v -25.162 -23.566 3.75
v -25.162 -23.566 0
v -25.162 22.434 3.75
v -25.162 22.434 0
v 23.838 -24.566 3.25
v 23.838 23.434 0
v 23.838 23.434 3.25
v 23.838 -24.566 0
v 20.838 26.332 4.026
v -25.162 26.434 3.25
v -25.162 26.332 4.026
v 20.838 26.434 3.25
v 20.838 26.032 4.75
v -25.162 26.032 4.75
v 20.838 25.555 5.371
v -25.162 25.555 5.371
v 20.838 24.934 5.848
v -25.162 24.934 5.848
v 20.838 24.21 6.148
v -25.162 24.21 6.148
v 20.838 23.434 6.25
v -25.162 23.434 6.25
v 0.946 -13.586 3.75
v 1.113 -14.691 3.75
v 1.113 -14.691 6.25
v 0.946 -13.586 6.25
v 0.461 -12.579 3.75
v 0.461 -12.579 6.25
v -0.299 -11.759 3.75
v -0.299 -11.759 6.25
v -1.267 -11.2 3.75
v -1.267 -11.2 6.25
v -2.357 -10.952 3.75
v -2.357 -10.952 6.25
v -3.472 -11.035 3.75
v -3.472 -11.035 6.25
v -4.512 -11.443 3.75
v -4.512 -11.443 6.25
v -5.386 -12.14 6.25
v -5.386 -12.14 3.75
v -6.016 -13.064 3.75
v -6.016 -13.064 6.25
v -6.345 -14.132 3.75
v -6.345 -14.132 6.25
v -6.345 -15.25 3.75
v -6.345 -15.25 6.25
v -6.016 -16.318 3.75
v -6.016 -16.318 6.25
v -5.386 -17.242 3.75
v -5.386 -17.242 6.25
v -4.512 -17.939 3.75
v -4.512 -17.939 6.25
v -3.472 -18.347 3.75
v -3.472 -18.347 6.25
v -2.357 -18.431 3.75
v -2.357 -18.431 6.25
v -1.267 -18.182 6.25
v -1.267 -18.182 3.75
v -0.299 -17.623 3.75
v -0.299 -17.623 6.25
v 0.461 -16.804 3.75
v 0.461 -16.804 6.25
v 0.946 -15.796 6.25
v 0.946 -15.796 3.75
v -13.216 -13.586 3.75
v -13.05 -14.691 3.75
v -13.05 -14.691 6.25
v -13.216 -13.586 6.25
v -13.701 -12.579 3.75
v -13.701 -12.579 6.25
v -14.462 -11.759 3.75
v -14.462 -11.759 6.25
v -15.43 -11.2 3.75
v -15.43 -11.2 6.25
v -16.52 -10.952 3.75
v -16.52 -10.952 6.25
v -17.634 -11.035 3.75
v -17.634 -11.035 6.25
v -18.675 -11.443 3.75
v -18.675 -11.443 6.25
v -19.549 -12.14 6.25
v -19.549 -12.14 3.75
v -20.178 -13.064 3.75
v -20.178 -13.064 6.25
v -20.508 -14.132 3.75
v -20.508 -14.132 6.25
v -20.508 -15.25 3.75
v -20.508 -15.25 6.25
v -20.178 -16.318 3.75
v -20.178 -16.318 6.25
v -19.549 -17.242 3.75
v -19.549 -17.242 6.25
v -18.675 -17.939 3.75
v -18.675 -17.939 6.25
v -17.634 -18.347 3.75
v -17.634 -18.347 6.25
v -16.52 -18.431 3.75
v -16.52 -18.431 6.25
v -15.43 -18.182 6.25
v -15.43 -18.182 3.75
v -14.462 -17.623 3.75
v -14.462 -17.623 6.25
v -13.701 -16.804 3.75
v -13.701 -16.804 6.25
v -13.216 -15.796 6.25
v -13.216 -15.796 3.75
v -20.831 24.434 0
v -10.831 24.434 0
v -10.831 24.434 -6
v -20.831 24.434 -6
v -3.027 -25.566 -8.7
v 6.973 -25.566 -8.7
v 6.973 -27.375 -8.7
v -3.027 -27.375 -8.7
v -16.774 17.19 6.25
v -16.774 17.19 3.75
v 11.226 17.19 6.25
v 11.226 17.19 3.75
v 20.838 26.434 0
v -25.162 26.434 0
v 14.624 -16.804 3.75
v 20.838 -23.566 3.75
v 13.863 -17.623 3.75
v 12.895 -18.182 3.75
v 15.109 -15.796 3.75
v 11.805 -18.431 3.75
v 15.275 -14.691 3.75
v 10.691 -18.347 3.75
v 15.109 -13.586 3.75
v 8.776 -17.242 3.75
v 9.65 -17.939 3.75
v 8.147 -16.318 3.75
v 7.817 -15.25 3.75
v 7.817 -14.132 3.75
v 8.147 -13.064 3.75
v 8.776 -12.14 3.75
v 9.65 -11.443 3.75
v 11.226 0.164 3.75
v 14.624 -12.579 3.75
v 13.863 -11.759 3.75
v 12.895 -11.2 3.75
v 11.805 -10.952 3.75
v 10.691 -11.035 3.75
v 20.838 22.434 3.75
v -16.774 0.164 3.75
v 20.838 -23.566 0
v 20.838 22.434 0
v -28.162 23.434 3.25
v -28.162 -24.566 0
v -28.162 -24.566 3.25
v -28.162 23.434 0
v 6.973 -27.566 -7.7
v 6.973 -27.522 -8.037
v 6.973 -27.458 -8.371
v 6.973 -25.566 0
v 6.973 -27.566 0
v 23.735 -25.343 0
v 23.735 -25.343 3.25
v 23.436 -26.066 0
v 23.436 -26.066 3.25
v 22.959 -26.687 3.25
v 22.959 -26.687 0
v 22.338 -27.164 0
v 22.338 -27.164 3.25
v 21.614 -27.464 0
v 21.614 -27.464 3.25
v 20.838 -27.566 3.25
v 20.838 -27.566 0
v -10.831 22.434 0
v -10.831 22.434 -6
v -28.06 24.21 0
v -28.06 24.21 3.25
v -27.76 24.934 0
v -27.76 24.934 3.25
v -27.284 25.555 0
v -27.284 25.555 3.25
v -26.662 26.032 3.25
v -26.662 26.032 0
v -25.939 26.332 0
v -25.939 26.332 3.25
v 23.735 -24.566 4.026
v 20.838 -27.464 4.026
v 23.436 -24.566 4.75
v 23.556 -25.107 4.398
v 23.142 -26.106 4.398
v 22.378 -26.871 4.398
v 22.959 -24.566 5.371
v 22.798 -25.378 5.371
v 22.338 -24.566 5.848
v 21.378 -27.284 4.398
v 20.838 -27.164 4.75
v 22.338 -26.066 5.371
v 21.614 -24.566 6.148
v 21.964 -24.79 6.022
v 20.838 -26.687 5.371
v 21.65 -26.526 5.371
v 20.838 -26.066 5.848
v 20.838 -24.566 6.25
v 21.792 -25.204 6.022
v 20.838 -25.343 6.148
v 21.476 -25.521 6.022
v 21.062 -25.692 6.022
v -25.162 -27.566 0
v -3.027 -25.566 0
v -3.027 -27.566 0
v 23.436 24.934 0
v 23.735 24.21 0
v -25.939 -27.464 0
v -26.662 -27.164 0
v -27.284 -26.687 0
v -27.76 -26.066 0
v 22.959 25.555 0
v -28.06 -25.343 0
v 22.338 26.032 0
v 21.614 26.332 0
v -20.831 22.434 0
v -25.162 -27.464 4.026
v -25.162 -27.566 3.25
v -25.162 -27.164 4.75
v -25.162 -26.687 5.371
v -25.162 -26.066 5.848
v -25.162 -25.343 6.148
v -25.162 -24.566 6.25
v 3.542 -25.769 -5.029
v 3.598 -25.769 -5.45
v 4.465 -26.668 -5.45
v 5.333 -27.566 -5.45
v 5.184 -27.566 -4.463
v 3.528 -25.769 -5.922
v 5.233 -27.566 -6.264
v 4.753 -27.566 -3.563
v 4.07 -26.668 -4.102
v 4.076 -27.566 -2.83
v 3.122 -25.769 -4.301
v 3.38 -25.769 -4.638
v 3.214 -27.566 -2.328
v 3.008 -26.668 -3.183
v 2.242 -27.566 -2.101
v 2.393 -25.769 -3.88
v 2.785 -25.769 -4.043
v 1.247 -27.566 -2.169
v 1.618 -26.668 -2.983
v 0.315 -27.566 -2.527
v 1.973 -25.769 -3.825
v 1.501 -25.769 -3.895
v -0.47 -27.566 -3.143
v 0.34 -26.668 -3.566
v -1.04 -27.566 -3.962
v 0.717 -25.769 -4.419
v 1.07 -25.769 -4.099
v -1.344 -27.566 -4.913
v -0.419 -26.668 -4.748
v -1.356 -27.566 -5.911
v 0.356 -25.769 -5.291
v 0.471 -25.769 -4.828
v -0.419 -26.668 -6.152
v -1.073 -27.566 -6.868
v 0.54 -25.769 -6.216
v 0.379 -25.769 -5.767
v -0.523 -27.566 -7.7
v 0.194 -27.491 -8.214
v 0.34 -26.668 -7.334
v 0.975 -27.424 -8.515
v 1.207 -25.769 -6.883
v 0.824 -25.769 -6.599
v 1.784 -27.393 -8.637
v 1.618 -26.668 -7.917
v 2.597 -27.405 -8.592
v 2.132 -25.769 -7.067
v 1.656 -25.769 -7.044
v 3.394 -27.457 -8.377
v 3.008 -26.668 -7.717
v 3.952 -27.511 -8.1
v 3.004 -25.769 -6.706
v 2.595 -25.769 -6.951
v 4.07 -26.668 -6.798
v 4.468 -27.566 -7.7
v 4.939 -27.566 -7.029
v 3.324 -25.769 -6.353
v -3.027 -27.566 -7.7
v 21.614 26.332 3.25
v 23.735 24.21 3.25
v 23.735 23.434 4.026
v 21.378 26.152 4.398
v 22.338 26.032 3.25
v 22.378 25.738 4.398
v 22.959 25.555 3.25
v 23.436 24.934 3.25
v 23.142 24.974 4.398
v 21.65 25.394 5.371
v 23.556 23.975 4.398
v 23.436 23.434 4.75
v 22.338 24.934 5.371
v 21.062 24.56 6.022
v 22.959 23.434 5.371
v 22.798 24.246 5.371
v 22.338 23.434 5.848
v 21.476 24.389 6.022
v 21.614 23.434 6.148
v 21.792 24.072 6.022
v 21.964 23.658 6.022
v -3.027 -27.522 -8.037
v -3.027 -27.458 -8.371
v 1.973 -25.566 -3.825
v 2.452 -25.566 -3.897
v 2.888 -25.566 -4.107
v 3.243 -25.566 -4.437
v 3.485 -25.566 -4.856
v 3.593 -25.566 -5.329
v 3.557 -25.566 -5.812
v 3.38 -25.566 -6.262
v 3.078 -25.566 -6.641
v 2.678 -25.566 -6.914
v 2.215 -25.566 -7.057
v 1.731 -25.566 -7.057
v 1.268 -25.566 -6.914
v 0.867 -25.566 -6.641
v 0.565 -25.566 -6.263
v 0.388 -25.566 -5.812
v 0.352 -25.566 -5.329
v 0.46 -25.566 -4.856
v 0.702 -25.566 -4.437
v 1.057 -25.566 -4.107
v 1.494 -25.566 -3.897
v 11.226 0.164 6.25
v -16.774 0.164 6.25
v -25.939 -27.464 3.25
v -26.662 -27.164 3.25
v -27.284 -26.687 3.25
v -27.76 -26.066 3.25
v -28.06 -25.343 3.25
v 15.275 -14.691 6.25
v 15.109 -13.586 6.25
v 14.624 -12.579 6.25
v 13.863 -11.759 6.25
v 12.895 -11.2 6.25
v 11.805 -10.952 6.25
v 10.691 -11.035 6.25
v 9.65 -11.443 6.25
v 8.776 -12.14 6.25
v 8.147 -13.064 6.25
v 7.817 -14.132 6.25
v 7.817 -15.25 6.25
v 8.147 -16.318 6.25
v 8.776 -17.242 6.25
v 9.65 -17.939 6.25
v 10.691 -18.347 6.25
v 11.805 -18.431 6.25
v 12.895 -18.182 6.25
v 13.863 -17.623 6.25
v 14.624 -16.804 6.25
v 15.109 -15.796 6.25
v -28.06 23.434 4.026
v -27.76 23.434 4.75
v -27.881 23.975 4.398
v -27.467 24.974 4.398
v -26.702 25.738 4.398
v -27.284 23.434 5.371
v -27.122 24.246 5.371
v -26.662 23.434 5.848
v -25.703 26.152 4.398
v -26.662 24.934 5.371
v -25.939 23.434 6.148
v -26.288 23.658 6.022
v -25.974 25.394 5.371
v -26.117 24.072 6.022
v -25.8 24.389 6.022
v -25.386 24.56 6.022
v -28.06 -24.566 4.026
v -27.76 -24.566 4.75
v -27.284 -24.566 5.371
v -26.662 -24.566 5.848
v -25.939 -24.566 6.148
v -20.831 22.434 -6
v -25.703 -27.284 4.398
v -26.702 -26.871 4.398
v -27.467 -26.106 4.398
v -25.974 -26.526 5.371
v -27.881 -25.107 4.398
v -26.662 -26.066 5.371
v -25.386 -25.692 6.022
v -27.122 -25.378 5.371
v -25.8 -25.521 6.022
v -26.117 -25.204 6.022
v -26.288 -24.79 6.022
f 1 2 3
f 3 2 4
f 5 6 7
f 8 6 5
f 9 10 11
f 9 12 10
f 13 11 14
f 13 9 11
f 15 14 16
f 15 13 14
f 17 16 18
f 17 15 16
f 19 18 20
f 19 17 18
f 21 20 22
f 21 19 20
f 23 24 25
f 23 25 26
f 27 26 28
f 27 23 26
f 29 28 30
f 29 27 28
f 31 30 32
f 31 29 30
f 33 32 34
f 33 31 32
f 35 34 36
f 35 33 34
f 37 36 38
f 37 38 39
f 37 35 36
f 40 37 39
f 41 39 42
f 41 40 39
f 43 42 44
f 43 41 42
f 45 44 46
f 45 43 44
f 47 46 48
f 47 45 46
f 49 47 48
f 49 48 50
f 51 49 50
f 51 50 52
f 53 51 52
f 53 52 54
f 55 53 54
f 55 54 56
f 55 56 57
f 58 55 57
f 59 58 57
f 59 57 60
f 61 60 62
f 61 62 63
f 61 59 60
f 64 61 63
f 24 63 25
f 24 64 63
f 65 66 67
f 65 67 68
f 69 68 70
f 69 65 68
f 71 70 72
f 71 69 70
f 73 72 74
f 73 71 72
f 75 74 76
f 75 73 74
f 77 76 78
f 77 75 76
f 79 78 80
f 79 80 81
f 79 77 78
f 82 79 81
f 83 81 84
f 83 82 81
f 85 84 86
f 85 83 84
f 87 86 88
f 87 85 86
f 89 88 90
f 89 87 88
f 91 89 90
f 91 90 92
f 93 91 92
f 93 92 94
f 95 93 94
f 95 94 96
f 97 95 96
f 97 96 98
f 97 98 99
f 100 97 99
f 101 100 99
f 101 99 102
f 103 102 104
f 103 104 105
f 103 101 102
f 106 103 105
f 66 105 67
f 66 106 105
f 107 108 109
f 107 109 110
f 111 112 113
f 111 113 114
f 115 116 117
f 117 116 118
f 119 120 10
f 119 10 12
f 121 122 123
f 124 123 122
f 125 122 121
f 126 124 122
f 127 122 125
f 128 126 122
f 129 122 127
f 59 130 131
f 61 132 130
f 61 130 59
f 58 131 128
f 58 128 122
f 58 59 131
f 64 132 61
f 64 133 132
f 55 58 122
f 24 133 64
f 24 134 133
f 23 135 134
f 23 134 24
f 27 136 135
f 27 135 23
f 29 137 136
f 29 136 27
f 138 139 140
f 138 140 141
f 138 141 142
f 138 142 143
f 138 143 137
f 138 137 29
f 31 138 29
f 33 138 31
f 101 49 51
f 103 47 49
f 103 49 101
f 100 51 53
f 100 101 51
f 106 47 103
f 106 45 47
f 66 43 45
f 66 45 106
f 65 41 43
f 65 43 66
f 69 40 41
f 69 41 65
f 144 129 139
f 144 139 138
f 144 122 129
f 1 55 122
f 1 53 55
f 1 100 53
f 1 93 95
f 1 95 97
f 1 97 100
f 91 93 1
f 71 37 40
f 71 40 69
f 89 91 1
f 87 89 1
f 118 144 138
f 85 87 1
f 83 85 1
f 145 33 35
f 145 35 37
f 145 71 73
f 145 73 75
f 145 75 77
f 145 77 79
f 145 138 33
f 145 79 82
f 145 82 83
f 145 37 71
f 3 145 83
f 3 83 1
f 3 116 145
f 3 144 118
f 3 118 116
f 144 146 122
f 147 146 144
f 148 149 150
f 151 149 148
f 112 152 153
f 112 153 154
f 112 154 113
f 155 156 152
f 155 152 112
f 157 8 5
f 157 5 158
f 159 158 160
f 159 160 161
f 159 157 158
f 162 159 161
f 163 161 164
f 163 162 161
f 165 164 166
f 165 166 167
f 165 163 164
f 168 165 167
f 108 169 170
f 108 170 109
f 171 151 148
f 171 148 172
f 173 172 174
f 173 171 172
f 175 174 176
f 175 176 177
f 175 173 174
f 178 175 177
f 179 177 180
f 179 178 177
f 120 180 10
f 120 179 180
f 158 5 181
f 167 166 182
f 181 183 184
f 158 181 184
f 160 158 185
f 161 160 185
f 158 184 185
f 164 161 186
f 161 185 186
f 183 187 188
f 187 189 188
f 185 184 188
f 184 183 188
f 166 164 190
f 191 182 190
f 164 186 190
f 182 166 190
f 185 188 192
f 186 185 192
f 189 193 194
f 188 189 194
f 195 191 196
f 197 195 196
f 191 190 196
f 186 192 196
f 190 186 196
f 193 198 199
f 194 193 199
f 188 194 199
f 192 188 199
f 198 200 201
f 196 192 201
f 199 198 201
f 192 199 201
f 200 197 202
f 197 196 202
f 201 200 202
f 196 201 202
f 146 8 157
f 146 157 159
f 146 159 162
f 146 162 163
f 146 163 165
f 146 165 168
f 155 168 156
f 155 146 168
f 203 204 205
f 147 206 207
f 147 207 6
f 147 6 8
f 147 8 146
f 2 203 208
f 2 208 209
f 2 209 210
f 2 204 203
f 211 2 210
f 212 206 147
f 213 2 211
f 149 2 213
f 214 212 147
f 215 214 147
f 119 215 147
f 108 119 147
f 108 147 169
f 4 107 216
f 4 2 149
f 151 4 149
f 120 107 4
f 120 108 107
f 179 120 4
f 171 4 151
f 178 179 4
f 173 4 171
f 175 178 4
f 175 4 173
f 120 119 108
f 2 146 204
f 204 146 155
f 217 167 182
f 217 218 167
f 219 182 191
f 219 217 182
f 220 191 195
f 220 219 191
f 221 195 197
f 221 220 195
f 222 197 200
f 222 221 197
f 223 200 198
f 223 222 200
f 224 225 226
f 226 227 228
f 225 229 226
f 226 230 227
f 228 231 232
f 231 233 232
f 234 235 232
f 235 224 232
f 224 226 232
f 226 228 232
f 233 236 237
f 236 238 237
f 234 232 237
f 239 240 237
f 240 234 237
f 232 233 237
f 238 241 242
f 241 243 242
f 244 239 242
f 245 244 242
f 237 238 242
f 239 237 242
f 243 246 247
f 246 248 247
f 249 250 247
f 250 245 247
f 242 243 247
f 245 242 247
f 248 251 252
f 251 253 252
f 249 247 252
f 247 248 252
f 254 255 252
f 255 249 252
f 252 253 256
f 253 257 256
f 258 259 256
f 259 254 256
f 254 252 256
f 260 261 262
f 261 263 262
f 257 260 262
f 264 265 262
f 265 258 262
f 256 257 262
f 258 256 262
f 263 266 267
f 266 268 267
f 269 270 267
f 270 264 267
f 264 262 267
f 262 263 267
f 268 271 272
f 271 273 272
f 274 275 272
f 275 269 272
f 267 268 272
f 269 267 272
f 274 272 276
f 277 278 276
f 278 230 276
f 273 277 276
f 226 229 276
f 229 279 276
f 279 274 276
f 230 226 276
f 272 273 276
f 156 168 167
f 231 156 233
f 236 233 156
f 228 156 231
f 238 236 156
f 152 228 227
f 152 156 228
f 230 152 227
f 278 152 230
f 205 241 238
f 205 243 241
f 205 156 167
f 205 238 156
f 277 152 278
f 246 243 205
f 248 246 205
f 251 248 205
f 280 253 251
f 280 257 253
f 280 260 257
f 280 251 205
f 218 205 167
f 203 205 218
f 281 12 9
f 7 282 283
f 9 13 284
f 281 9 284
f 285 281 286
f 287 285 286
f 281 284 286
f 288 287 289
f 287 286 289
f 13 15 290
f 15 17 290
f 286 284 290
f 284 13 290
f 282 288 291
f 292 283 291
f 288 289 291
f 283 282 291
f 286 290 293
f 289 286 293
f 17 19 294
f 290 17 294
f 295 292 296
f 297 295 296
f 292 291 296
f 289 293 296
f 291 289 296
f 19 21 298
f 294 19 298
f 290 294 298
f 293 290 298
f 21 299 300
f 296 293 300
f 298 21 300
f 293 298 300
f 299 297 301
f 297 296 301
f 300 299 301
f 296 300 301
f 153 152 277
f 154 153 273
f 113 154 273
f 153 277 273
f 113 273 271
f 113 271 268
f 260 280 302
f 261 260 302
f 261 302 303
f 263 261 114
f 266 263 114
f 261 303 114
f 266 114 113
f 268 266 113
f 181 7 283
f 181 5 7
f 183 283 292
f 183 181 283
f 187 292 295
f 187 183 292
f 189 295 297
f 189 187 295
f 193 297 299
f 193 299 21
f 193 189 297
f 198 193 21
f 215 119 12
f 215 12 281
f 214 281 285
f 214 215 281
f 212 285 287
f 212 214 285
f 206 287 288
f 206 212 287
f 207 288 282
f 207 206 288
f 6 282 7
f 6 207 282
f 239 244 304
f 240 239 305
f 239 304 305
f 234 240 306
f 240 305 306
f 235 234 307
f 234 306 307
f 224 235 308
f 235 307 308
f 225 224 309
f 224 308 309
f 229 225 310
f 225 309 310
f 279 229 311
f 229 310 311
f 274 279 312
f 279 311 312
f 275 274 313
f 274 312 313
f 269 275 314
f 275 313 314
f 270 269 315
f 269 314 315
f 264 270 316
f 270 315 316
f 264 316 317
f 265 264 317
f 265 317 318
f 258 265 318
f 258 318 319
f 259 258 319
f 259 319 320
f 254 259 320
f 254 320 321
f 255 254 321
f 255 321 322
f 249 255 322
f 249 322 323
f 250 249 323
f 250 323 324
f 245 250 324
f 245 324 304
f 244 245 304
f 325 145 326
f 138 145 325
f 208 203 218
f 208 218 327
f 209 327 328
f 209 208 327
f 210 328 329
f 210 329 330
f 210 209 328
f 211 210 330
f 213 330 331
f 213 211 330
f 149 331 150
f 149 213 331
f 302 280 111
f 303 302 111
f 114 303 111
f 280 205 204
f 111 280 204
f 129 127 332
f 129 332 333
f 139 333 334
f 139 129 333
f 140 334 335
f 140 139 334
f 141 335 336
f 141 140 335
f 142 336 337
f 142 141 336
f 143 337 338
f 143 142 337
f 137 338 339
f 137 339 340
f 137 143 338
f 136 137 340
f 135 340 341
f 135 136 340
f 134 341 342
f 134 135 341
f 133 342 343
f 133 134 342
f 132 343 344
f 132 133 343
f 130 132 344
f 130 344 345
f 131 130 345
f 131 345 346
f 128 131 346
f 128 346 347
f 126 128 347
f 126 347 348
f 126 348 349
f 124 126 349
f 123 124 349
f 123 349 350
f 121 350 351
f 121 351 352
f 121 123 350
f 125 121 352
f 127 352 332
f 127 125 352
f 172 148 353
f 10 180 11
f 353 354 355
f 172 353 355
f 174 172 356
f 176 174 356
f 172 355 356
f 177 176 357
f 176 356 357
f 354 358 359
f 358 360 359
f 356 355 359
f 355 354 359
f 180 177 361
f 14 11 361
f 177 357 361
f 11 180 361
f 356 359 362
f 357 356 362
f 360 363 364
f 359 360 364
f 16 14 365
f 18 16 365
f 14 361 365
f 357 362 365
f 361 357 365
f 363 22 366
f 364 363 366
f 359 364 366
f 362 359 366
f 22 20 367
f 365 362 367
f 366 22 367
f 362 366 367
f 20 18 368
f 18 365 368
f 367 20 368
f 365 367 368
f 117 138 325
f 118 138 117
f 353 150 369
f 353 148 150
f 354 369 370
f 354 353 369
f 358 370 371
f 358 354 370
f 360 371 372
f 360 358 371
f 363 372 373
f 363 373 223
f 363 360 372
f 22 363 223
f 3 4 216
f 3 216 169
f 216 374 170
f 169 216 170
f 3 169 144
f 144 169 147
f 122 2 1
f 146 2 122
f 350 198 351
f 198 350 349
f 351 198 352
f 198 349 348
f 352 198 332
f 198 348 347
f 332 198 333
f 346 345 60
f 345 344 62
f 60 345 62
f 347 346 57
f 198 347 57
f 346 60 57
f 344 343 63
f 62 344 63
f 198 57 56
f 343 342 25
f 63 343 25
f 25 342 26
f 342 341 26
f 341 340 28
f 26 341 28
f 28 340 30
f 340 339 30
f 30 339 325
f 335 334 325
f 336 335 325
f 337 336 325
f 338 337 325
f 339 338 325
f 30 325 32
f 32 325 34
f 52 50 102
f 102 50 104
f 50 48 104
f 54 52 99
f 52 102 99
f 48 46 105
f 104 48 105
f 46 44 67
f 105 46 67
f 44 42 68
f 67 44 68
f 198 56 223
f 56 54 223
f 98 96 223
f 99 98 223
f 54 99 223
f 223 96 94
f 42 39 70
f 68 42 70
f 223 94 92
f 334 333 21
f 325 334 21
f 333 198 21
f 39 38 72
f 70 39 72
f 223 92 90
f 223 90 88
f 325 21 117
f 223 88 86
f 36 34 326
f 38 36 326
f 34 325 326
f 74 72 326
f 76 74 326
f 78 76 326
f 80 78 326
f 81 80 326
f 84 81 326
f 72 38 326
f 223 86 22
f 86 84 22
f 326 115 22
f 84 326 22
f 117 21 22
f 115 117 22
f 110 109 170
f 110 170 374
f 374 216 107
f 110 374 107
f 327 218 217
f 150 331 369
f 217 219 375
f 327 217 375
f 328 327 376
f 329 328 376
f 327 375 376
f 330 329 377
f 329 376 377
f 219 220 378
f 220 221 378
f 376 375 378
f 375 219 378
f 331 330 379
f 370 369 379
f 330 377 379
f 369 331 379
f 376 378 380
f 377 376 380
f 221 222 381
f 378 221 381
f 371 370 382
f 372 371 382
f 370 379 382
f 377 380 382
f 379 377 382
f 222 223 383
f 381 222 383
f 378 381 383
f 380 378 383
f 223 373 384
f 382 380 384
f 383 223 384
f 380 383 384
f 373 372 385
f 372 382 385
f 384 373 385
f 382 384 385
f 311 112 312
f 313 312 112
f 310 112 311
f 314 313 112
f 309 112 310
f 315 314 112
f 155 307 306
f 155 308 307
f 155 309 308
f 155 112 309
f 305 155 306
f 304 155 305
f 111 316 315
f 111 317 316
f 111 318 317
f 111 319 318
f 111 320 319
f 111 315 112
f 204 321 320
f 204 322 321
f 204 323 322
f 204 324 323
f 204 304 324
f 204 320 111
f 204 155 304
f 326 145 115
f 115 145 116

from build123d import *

# Parameters (mm, degrees)
CROQUIS1_W              = 46
CROQUIS1_H              = 46
SALIENTE_EXTRUIR1_DEPTH = 3.75
CROQUIS2_W              = 10
CROQUIS2_H              = 2
SALIENTE_EXTRUIR2_DEPTH = 8.7
CROQUIS5_W              = 10
CROQUIS5_H              = 2
SALIENTE_EXTRUIR3_DEPTH = 6
CROQUIS6_R              = 1.625
CORTAR_EXTRUIR1_DEPTH   = 2
CROQUIS7_R              = 3.35997123
CORTAR_EXTRUIR2_DEPTH   = 1.8
CORTAR_EXTRUIR2_DRAFT   = -44
CORTAR_EXTRUIR3_DEPTH   = 10
CROQUIS10_R             = 3.75
CROQUIS10_W             = 28
CROQUIS10_H             = 17.026229448
SALIENTE_EXTRUIR4_DEPTH = 2.5
REDONDEO1_R             = 3


with BuildPart() as part:
    # Croquis1 → Saliente-Extruir1 (new body)
    with BuildSketch(Plane.XY):
        with BuildLine():
            Line((-25.16229051, 26.433935563), (20.83770949, 26.433935563))
            ThreePointArc((20.83770949, 26.433935563), (22.959029834, 25.555255907), (23.83770949, 23.433935563))
            Line((23.83770949, 23.433935563), (23.83770949, -24.566064437))
            ThreePointArc((23.83770949, -24.566064437), (22.959029834, -26.687384781), (20.83770949, -27.566064437))
            Line((20.83770949, -27.566064437), (-25.16229051, -27.566064437))
            ThreePointArc((-25.16229051, -27.566064437), (-27.283610853, -26.687384781), (-28.16229051, -24.566064437))
            Line((-28.16229051, -24.566064437), (-28.16229051, 23.433935563))
            ThreePointArc((-28.16229051, 23.433935563), (-27.283610853, 25.555255907), (-25.16229051, 26.433935563))
        make_face()
        with Locations((-2.16229051, -0.566064437)):
            Rectangle(CROQUIS1_W, CROQUIS1_H, mode=Mode.SUBTRACT)
    extrude(amount=SALIENTE_EXTRUIR1_DEPTH)

    # Croquis2 → Saliente-Extruir2 (add)
    with BuildSketch(Plane(origin=(0, 0, 0), x_dir=(-1, 0, 0), z_dir=(0, 0, -1))):
        with Locations((-1.97270949, -26.566064437)):
            Rectangle(CROQUIS2_W, CROQUIS2_H)
    extrude(amount=SALIENTE_EXTRUIR2_DEPTH)

    # Croquis5 → Saliente-Extruir3 (add)
    with BuildSketch(Plane(origin=(0, 0, 0), x_dir=(-1, 0, 0), z_dir=(0, 0, -1))):
        with Locations((15.830877534, 23.433935563)):
            Rectangle(CROQUIS5_W, CROQUIS5_H)
    extrude(amount=SALIENTE_EXTRUIR3_DEPTH)

    # Croquis6 → Cortar-Extruir1 (cut)
    with BuildSketch(Plane(origin=(0, -25.566064437, 0), x_dir=(1, 0, 0), z_dir=(0, 1, 0))):
        with Locations(Location((1.97270949, 5.45, 0), (0, 0, 270))):
            Circle(CROQUIS6_R)
    extrude(amount=-CORTAR_EXTRUIR1_DEPTH, mode=Mode.SUBTRACT)


with BuildPart() as cortar_extruir2_tool:
    # Croquis7 → Cortar-Extruir2 (with draft: the straight prism first)
    with BuildSketch(Plane.XZ.offset(27.566064437)):
        with Locations((1.97270949, -5.45)):
            Circle(CROQUIS7_R)
    extrude(amount=-CORTAR_EXTRUIR2_DEPTH)
    # Cortar-Extruir2: the draft: its side faces are tilted about the plane it starts from
    cortar_extruir2_sides = [cortar_extruir2_tool.faces().sort_by_distance(p)[0] for p in [
        (-1.38726174, -26.666064437, -5.45),
    ]]
    draft(cortar_extruir2_sides, Plane.XZ.offset(27.566064437), CORTAR_EXTRUIR2_DRAFT)


with BuildPart() as part_1:
    add(part.part)

    # Cortar-Extruir2: cut by cortar_extruir2_tool
    add(cortar_extruir2_tool.part, mode=Mode.SUBTRACT)

    # Croquis9 → Cortar-Extruir3 (cut)
    with BuildSketch(Plane.ZY.offset(3.02729051)):
        with BuildLine():
            Line((-8.7, -27.375158196), (-8.7, -27.566064437))
            Line((-8.7, -27.566064437), (-7.7, -27.566064437))
            ThreePointArc((-7.7, -27.566064437), (-8.204176074, -27.492486318), (-8.7, -27.375158196))
        make_face()
    extrude(amount=-CORTAR_EXTRUIR3_DEPTH, mode=Mode.SUBTRACT)

    # Croquis10 → Saliente-Extruir4 (add)
    with BuildSketch(Plane.XY.offset(3.75)):
        with BuildLine():
            Line((-25.16229051, 26.433935563), (20.83770949, 26.433935563))
            ThreePointArc((20.83770949, 26.433935563), (22.959029834, 25.555255907), (23.83770949, 23.433935563))
            Line((23.83770949, 23.433935563), (23.83770949, -24.566064437))
            ThreePointArc((23.83770949, -24.566064437), (22.959029834, -26.687384781), (20.83770949, -27.566064437))
            Line((20.83770949, -27.566064437), (-25.16229051, -27.566064437))
            ThreePointArc((-25.16229051, -27.566064437), (-27.283610853, -26.687384781), (-28.16229051, -24.566064437))
            Line((-28.16229051, -24.566064437), (-28.16229051, 23.433935563))
            ThreePointArc((-28.16229051, 23.433935563), (-27.283610853, 25.555255907), (-25.16229051, 26.433935563))
        make_face()
        with Locations((-16.79979051, -14.691064437)):
            Circle(CROQUIS10_R, mode=Mode.SUBTRACT)
        with Locations((-2.63729051, -14.691064437)):
            Circle(CROQUIS10_R, mode=Mode.SUBTRACT)
        with Locations((11.52520949, -14.691064437)):
            Circle(CROQUIS10_R, mode=Mode.SUBTRACT)
        with Locations((-2.773558379, 8.677050287)):
            Rectangle(CROQUIS10_W, CROQUIS10_H, mode=Mode.SUBTRACT)
    extrude(amount=SALIENTE_EXTRUIR4_DEPTH)

    # Redondeo1
    redondeo1_edges = [part_1.edges().sort_by_distance(p)[0] for p in [
        (-27.283610853, 25.555255907, 6.25),
        (-28.16229051, -0.566064437, 6.25),
        (-27.283610853, -26.687384781, 6.25),
        (-2.16229051, -27.566064437, 6.25),
        (22.959029834, -26.687384781, 6.25),
        (23.83770949, -0.566064437, 6.25),
        (22.959029834, 25.555255907, 6.25),
        (-2.16229051, 26.433935563, 6.25),
    ]]
    fillet(redondeo1_edges, radius=REDONDEO1_R)


solid = part_1.part
